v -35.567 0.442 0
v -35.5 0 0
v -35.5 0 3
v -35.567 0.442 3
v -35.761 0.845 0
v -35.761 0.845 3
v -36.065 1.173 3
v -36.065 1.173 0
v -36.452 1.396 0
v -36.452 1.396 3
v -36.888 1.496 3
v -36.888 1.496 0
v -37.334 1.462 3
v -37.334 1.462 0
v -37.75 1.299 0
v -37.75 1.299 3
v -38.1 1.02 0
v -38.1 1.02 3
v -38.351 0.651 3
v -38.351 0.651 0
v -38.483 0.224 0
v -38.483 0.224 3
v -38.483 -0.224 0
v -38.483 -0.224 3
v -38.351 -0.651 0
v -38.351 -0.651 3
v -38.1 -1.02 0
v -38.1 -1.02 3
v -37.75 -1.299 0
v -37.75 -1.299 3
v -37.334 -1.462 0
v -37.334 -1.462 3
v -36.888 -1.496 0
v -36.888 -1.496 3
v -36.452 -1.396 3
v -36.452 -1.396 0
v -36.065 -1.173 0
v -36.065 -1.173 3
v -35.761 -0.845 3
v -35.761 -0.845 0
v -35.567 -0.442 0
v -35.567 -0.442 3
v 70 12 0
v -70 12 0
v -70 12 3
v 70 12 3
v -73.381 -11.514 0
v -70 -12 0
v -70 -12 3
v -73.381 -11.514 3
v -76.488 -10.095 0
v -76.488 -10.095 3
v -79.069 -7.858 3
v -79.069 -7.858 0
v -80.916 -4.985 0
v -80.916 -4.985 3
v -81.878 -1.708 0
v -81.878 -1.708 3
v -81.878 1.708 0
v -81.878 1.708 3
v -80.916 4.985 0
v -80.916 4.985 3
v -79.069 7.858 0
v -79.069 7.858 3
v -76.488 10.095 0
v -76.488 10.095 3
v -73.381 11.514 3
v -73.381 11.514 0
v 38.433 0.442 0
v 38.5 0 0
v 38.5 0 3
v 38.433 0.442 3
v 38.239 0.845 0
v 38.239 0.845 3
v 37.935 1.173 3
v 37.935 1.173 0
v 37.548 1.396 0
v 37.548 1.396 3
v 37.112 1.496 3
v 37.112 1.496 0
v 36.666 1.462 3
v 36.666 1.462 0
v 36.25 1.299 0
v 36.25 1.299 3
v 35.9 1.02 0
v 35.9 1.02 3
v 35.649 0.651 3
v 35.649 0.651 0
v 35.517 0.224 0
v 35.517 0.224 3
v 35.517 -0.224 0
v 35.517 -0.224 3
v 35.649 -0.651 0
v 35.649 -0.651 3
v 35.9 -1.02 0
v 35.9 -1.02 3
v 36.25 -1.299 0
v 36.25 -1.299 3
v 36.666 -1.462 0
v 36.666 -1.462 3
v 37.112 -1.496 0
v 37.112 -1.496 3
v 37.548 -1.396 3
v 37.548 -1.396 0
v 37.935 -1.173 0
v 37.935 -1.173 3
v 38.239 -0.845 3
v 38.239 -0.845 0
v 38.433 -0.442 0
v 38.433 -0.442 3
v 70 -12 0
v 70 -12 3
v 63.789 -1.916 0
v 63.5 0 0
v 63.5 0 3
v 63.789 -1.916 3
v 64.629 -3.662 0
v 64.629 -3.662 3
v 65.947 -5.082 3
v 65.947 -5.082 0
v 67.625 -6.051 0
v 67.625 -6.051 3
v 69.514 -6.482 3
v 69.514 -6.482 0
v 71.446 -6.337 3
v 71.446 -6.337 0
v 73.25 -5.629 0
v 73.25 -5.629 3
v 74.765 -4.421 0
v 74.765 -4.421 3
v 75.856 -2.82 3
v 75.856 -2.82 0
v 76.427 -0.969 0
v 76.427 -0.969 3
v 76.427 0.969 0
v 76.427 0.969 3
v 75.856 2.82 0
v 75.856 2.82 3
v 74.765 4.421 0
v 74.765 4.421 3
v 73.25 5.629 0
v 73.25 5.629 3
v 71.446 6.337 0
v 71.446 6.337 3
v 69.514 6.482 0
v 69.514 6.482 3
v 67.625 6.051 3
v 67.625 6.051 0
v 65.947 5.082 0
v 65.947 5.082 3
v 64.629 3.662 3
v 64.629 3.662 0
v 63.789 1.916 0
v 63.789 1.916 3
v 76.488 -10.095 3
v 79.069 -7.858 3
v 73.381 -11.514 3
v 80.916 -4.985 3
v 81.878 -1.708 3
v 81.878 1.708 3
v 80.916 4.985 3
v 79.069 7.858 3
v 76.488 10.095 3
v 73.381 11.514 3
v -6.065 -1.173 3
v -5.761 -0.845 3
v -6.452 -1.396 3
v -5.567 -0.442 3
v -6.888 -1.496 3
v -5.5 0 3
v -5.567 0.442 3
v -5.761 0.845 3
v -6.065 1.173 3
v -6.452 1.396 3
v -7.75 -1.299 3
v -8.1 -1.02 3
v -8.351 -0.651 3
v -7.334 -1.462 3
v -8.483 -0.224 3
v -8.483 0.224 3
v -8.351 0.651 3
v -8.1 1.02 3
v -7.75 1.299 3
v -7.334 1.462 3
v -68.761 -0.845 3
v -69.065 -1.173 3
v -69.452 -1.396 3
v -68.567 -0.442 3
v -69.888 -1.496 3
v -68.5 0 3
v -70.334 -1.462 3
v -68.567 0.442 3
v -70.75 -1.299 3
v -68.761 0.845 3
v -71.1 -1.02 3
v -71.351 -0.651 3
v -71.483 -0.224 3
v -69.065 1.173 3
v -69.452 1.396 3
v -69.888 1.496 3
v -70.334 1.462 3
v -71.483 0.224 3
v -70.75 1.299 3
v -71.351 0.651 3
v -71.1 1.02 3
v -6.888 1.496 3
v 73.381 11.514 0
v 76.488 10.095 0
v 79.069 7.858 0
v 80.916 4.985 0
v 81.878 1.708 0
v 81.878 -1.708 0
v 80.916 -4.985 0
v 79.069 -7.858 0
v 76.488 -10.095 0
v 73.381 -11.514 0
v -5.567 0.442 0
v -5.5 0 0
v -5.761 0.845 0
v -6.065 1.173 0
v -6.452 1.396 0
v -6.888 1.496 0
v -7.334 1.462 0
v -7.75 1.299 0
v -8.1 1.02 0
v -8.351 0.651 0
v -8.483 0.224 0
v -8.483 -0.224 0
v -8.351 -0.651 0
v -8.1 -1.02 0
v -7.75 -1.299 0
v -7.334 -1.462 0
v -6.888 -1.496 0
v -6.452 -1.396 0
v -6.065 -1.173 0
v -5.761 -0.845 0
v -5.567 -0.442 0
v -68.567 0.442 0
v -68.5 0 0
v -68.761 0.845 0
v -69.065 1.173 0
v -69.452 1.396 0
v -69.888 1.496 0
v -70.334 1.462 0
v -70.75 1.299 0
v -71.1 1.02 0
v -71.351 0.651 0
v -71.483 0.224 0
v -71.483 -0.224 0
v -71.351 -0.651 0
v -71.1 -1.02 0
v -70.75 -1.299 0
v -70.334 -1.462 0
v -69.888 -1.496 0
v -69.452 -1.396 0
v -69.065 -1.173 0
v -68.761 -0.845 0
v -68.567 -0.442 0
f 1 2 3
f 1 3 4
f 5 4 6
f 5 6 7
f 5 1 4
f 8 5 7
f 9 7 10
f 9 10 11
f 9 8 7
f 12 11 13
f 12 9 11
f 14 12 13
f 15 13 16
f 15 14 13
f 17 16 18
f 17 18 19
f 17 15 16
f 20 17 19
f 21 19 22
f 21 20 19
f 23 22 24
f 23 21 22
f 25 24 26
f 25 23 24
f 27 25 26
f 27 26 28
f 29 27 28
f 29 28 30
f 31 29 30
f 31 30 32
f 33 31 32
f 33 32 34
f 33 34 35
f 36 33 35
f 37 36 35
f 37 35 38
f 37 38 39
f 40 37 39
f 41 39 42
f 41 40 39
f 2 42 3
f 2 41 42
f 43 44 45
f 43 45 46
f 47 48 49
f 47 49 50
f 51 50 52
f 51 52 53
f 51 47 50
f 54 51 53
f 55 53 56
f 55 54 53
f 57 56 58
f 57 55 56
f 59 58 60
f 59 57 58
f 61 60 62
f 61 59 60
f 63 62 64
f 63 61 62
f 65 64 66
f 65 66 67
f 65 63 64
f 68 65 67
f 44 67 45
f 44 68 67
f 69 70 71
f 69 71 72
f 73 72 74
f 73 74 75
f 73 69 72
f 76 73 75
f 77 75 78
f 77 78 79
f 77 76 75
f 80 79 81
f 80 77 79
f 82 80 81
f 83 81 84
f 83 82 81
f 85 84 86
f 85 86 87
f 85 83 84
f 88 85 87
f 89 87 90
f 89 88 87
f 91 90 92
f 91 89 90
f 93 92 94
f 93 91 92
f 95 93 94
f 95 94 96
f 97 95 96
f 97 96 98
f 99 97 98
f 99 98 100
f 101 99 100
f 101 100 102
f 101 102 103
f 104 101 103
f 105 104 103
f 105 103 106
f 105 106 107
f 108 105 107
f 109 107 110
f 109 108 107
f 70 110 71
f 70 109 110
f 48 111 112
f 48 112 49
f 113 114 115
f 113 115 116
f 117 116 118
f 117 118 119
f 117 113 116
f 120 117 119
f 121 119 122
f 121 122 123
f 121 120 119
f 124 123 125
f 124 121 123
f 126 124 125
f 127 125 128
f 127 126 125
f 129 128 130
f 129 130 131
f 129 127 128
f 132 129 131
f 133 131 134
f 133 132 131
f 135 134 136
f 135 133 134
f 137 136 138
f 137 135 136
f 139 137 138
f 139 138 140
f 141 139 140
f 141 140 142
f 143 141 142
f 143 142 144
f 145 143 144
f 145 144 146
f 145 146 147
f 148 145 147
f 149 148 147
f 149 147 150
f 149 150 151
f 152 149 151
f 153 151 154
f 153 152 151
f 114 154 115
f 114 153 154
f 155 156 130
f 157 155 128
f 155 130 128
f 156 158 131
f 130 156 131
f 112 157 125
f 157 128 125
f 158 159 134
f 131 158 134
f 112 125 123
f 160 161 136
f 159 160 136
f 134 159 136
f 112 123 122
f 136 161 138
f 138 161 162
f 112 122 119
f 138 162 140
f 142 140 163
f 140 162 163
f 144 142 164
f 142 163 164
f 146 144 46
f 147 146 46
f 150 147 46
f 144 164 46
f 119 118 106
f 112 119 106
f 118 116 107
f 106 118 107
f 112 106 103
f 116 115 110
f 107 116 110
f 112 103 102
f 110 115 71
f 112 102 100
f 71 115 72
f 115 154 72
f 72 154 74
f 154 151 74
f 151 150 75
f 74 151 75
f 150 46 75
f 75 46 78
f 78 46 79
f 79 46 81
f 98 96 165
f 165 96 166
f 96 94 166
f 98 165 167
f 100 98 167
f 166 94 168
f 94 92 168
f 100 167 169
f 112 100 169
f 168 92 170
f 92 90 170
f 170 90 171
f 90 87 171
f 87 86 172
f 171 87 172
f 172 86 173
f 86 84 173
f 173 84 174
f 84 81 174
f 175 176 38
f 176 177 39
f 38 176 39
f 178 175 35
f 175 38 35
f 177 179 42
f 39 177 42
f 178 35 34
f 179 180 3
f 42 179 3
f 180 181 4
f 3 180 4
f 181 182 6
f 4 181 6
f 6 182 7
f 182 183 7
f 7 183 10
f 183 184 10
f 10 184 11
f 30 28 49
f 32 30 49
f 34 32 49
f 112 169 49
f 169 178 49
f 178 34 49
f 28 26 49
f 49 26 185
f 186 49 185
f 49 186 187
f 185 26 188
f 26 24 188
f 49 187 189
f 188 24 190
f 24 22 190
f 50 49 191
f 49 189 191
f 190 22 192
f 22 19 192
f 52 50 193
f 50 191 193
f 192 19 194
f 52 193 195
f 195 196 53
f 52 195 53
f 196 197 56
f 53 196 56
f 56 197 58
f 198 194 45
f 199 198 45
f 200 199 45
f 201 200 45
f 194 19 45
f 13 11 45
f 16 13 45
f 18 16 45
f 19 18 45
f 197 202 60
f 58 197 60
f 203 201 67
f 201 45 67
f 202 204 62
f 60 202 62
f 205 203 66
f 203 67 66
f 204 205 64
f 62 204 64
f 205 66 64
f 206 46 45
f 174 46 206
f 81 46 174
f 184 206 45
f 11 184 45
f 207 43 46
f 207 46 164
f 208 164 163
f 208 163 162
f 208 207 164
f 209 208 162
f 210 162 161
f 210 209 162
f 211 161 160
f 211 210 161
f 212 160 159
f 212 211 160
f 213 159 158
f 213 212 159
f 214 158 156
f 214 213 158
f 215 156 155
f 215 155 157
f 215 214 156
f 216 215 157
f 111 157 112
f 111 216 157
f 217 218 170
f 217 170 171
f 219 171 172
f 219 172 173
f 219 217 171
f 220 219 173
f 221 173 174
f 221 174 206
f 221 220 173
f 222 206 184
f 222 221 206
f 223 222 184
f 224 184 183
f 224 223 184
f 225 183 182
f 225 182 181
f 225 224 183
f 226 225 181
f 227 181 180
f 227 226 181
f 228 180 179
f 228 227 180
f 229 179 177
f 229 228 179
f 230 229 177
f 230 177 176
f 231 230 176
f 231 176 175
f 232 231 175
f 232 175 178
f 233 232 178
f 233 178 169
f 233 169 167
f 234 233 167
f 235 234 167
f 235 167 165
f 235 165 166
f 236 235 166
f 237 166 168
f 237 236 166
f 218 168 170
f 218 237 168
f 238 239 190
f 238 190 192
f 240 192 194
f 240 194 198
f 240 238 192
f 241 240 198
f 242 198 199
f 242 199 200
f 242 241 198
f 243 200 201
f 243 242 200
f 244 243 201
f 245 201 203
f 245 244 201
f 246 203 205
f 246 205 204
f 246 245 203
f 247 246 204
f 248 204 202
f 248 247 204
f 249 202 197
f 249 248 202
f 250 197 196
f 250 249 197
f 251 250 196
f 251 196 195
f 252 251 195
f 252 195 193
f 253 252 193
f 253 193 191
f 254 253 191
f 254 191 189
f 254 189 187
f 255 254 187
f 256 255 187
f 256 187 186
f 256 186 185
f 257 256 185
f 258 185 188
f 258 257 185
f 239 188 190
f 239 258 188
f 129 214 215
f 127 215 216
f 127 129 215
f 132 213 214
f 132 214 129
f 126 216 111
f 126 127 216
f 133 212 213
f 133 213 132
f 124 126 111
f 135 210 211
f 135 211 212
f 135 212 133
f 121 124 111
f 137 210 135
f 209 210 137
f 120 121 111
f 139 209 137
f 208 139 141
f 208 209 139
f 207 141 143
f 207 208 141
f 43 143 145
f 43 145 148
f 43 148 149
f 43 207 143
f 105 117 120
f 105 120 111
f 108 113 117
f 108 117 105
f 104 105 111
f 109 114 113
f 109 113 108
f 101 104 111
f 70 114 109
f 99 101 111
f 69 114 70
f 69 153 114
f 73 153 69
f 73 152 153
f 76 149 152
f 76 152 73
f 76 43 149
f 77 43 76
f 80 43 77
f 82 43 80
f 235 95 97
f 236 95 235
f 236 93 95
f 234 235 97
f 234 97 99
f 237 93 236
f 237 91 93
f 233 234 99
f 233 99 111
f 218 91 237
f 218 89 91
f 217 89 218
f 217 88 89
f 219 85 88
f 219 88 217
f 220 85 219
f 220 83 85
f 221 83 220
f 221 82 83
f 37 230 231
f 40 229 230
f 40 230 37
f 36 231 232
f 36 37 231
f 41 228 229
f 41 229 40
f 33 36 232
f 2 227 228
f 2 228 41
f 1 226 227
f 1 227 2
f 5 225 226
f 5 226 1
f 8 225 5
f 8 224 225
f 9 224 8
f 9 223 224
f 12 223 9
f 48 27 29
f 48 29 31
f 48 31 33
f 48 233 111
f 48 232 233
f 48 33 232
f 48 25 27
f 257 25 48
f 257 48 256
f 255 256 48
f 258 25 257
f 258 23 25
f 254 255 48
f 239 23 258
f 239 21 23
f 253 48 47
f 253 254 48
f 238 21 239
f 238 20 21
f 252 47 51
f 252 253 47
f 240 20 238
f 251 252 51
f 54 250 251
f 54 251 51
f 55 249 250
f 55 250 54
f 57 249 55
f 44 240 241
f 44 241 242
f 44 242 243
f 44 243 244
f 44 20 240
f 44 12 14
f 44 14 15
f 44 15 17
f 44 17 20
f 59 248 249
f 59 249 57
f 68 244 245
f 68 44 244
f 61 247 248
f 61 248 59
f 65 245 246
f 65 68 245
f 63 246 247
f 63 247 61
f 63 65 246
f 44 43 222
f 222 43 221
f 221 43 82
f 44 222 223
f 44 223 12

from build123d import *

# Parameters (mm, degrees)
ESQUISSE1_R        = 1.5
ESQUISSE1_R_2      = 6.5
BOSS_EXTRU_1_DEPTH = 3


with BuildPart() as part:
    # Esquisse1 → Boss.-Extru.1 (new body)
    with BuildSketch(Plane.XY):
        with BuildLine():
            Line((-70, 12), (70, 12))
            ThreePointArc((70, 12), (82, 0), (70, -12))
            Line((70, -12), (-70, -12))
            ThreePointArc((-70, -12), (-82, 0), (-70, 12))
        make_face()
        with Locations((-7, 0)):
            Circle(ESQUISSE1_R, mode=Mode.SUBTRACT)
        with Locations((-70, 0)):
            Circle(ESQUISSE1_R, mode=Mode.SUBTRACT)
        with Locations(Location((70, 0, 0), (0, 0, 180))):
            Circle(ESQUISSE1_R_2, mode=Mode.SUBTRACT)
        with Locations((-37, 0)):
            Circle(ESQUISSE1_R, mode=Mode.SUBTRACT)
        with Locations((37, 0)):
            Circle(ESQUISSE1_R, mode=Mode.SUBTRACT)
    extrude(amount=BOSS_EXTRU_1_DEPTH)


solid = part.part
